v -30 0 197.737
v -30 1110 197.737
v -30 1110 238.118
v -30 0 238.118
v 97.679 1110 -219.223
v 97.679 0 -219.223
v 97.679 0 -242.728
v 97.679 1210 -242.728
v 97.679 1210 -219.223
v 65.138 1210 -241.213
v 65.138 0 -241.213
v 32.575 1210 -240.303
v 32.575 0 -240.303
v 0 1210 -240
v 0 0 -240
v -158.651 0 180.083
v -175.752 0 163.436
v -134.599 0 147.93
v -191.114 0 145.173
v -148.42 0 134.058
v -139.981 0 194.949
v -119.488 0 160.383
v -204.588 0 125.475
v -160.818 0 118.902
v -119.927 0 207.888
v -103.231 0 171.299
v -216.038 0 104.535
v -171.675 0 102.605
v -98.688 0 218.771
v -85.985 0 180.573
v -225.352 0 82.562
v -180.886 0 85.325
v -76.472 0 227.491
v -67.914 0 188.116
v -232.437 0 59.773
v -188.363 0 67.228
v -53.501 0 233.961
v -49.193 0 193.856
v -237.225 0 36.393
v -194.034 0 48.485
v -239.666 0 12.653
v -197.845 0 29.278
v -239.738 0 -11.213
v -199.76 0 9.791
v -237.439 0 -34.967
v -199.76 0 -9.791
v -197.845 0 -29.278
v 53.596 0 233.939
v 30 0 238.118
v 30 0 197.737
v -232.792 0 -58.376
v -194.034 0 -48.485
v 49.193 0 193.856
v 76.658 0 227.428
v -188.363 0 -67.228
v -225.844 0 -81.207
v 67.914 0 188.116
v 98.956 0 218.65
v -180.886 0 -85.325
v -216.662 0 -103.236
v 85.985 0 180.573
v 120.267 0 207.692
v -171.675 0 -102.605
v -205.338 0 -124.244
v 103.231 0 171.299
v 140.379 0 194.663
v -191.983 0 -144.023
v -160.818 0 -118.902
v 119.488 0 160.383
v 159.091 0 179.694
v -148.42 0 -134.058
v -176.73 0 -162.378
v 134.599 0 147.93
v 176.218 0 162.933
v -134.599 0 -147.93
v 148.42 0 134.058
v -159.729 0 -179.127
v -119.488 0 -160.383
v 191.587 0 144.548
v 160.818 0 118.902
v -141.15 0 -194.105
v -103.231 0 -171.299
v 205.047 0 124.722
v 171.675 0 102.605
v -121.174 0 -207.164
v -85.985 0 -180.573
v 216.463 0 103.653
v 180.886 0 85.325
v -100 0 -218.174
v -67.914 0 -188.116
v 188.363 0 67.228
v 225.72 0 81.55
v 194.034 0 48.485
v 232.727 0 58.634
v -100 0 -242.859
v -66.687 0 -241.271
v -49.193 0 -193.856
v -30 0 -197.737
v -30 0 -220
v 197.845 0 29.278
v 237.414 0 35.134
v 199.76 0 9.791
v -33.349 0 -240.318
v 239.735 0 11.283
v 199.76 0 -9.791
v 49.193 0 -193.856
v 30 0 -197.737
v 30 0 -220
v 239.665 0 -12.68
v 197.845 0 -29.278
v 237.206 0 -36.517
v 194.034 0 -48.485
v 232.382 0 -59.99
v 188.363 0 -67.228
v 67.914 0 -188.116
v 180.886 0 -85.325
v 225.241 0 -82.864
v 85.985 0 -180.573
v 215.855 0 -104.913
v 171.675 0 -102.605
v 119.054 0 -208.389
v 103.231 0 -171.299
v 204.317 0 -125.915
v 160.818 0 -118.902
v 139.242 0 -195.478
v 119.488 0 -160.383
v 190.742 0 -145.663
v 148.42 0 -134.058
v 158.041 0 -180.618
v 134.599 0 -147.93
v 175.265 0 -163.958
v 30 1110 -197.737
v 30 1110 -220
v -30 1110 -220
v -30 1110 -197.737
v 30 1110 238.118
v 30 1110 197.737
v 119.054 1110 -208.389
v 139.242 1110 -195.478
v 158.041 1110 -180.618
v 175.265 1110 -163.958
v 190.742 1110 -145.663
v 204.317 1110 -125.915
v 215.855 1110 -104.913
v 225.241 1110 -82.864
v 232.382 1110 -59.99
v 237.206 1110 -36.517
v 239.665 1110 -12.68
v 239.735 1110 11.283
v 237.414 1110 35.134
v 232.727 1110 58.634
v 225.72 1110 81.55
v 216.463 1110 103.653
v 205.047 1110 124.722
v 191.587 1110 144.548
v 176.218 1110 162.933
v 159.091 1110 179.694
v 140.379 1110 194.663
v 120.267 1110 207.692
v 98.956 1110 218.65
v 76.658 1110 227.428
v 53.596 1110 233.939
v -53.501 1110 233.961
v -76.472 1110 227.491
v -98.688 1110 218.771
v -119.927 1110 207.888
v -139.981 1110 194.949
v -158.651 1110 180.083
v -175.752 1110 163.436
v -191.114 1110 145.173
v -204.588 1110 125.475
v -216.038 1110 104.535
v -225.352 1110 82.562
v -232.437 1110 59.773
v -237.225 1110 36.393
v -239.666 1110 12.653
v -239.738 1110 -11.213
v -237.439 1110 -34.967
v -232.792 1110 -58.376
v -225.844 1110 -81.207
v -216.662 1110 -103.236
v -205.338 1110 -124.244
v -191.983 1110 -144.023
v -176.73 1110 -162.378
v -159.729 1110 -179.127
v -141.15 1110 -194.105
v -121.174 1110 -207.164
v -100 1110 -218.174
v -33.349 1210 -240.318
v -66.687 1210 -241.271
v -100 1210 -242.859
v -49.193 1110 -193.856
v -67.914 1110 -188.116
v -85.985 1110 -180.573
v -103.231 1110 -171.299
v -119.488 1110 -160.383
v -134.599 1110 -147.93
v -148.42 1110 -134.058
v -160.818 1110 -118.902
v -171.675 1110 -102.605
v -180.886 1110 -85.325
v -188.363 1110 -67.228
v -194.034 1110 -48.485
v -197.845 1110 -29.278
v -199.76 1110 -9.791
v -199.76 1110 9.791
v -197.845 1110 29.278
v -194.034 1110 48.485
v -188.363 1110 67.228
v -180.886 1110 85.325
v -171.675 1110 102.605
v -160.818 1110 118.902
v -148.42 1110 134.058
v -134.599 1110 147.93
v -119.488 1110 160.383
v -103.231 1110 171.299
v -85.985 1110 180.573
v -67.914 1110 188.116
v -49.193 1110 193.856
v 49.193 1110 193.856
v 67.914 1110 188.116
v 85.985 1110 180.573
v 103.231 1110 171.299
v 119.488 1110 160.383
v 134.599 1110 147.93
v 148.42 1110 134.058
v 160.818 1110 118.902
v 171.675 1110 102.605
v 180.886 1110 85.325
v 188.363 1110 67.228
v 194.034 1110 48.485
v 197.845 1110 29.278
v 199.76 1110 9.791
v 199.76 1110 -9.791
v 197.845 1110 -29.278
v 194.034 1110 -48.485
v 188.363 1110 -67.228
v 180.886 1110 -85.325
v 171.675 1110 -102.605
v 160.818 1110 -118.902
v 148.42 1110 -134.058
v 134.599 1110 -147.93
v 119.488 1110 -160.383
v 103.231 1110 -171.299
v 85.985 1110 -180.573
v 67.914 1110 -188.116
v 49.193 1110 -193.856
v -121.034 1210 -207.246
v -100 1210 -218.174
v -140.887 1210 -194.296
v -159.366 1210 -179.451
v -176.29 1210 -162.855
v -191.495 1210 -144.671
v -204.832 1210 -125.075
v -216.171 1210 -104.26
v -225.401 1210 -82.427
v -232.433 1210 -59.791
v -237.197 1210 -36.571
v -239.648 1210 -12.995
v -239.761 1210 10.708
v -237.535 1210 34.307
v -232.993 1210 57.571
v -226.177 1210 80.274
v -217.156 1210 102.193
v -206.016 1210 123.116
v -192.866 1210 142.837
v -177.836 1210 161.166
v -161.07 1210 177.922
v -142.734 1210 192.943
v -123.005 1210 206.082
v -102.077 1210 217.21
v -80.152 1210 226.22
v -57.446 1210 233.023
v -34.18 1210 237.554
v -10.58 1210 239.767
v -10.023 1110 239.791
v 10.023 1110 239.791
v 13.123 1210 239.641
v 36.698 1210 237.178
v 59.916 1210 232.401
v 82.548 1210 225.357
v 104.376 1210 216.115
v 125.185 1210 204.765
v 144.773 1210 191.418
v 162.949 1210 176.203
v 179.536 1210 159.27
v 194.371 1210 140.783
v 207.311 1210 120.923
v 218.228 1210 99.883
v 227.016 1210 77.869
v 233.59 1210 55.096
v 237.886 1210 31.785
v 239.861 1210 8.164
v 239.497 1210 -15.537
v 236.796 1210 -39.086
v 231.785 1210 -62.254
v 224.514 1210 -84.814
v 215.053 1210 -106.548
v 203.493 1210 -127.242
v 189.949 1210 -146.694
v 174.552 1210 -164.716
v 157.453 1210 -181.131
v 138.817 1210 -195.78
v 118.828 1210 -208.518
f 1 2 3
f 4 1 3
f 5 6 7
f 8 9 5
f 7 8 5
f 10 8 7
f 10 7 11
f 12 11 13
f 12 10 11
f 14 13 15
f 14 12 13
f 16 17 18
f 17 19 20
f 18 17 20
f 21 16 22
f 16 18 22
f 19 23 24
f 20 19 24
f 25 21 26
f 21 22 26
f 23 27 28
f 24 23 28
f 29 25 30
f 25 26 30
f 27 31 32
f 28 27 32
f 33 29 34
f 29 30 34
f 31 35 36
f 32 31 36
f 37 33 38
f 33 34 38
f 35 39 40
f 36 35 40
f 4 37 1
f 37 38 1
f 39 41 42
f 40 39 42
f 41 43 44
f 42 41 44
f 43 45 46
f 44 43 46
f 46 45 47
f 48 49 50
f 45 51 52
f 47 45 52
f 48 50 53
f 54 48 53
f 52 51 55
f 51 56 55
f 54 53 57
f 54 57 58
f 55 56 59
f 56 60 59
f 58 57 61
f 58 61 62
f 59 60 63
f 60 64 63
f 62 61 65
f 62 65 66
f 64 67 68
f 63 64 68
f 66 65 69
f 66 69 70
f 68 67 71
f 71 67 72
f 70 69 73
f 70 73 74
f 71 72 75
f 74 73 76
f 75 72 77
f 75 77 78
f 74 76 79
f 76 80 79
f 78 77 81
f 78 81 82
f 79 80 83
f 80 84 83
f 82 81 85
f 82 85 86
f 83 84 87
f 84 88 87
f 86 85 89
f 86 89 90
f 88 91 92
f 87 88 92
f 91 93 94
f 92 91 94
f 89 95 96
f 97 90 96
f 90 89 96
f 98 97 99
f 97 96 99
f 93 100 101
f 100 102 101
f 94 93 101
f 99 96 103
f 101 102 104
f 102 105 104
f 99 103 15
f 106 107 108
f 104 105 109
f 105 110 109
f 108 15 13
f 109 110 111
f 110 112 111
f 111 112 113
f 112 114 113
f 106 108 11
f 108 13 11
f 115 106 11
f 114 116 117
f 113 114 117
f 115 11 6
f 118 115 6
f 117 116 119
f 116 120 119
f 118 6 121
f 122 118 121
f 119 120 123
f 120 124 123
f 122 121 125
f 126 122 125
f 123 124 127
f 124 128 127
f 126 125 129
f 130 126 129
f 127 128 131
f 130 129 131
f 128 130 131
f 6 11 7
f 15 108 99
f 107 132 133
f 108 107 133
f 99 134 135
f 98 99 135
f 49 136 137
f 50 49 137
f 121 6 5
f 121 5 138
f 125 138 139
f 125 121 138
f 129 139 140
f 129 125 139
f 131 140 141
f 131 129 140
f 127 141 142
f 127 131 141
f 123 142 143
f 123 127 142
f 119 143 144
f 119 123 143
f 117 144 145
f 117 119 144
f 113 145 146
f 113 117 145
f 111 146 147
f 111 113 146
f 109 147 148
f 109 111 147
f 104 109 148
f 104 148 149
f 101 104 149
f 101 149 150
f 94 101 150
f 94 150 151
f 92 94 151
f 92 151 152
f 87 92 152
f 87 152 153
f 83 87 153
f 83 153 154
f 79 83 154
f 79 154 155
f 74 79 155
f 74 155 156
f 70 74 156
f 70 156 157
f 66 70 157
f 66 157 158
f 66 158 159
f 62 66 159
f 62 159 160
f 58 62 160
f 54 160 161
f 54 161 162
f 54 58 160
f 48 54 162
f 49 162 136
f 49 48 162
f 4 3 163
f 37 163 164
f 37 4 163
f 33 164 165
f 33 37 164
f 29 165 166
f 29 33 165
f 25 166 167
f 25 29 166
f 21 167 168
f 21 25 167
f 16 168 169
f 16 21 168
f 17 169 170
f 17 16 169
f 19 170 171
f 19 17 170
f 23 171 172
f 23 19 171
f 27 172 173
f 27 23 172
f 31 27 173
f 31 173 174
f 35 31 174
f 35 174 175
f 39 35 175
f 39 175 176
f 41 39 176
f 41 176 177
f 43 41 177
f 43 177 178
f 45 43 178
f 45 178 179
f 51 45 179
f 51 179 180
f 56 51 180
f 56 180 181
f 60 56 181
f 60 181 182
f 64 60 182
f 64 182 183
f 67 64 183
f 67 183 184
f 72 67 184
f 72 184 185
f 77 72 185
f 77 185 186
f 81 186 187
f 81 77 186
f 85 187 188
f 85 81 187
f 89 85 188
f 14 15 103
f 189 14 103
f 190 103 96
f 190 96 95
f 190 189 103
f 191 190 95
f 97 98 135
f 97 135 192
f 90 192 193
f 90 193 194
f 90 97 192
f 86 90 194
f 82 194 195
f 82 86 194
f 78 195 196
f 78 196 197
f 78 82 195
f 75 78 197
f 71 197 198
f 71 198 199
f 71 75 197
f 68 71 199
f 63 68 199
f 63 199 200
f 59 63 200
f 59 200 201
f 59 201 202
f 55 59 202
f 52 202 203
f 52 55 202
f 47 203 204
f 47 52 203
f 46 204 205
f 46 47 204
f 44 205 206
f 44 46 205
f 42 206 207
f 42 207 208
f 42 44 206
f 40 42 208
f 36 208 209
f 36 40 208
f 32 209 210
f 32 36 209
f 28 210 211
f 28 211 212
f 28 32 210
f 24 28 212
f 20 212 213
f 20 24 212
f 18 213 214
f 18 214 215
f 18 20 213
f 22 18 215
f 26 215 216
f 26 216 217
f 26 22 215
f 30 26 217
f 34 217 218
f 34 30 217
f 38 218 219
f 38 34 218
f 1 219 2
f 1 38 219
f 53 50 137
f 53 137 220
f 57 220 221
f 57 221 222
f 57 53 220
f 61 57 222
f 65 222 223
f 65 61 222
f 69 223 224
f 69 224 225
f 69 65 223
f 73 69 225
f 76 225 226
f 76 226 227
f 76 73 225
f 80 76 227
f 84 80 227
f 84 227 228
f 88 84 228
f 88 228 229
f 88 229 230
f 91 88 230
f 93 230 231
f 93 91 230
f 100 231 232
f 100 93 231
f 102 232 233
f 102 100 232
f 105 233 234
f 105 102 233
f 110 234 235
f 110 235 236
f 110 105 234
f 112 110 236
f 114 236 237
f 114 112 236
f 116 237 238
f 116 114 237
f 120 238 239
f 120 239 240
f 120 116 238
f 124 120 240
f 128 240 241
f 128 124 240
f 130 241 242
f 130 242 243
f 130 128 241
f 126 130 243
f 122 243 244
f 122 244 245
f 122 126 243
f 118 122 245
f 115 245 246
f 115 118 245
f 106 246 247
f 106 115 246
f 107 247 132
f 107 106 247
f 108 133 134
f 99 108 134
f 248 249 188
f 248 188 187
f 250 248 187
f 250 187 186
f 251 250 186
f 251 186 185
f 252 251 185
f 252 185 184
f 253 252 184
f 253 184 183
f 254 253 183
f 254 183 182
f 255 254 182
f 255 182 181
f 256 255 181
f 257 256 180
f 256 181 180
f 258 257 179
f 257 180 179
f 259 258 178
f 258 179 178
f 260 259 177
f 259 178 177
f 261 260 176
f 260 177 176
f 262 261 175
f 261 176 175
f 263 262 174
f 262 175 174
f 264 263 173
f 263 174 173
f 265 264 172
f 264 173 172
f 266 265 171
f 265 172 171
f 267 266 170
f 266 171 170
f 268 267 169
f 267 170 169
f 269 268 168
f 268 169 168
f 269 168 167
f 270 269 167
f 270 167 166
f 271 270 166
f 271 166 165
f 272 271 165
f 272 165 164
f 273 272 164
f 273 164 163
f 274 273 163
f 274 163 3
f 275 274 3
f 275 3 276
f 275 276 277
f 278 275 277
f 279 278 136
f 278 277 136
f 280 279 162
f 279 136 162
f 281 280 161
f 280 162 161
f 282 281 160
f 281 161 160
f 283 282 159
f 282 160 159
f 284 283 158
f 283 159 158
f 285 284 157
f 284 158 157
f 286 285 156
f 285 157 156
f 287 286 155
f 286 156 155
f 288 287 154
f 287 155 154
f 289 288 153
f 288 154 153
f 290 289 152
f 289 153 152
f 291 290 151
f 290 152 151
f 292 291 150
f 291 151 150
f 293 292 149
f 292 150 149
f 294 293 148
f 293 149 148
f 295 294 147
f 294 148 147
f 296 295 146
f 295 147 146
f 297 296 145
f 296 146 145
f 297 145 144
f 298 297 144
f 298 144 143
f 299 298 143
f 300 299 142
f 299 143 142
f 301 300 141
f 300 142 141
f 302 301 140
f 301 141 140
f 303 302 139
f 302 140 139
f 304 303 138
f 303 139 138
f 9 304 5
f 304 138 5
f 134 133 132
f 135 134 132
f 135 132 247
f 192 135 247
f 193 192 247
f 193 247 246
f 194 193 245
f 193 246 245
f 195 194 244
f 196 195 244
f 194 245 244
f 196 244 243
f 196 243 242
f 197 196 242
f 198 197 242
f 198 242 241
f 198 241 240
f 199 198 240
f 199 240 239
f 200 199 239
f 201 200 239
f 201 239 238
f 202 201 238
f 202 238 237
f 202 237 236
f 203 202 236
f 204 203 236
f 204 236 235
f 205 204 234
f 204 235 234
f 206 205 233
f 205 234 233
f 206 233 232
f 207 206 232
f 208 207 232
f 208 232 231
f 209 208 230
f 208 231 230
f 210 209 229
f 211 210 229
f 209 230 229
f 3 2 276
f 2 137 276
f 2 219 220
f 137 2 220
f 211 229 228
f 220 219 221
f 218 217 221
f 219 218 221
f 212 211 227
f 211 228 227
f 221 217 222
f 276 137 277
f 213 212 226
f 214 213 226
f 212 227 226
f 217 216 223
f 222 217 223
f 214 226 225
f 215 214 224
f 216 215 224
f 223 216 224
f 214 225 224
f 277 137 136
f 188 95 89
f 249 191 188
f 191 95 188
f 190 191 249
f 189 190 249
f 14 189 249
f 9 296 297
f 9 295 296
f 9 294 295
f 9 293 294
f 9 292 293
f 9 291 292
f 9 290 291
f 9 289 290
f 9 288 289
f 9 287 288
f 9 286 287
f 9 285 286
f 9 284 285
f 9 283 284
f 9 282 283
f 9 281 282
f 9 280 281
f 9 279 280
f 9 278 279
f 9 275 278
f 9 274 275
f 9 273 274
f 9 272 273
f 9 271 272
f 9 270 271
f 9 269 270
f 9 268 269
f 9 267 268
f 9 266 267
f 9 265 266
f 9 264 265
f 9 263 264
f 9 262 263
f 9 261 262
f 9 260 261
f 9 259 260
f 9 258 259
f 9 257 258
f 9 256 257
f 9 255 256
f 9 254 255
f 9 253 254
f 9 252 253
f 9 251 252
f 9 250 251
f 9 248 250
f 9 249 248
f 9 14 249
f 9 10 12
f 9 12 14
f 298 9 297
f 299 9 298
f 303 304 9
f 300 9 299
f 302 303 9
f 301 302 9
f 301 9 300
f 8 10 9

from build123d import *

# Parameters (mm, degrees)
BOSS_EXTRUDE1_DEPTH = 1110
SKETCH2_R           = 240
BOSS_EXTRUDE2_DEPTH = 100
BOSS_EXTRUDE3_DEPTH = 1210


with BuildPart() as part:
    # Sketch1 → Boss-Extrude1 (new body)
    with BuildSketch(Plane(origin=(0, 0, 0), x_dir=(1, 0, 0), z_dir=(0, 1, 0))):
        with BuildLine():
            Line((-30, -197.737199333), (-30, -238.117617996))
            ThreePointArc((-30, -238.117617996), (0, 240), (30, -238.117617996))
            Line((30, -238.117617996), (30, -197.737199333))
            ThreePointArc((30, -197.737199333), (200, 0), (30, 197.737199333))
            Line((30, 197.737199333), (30, 220))
            Line((30, 220), (-30, 220))
            Line((-30, 220), (-30, 197.737199333))
            ThreePointArc((-30, 197.737199333), (-200, 0), (-30, -197.737199333))
        make_face()
    extrude(amount=BOSS_EXTRUDE1_DEPTH)

    # Sketch2 → Boss-Extrude2 (add)
    with BuildSketch(Plane(origin=(0, 1110, 0), x_dir=(1, 0, 0), z_dir=(0, 1, 0))):
        with Locations(Location((0, 0, 0), (0, 0, 262.819244219))):
            Circle(SKETCH2_R)
    extrude(amount=BOSS_EXTRUDE2_DEPTH)

    # Sketch3 → Boss-Extrude3 (add, through all)
    with BuildSketch(Plane(origin=(0, 1210, 0), x_dir=(1, 0, 0), z_dir=(0, 1, 0))):
        with BuildLine():
            Line((-100, 242.859479034), (-100, 240))
            Line((-100, 240), (-100, 218.174242293))
            ThreePointArc((-100, 218.174242293), (-51.177054673, 234.48008247), (-3e-09, 240))
            ThreePointArc((-3e-09, 240), (-50.020437376, 240.715015829), (-100, 242.859479034))
        make_face()
        with BuildLine():
            ThreePointArc((97.679334818, 242.72819872), (48.858713445, 240.682182644), (-3e-09, 240))
            ThreePointArc((-3e-09, 240), (49.932288955, 234.748304615), (97.679334818, 219.223054329))
            Line((97.679334818, 219.223054329), (97.679334818, 242.72819872))
        make_face()
    extrude(amount=-BOSS_EXTRUDE3_DEPTH)


solid = part.part
